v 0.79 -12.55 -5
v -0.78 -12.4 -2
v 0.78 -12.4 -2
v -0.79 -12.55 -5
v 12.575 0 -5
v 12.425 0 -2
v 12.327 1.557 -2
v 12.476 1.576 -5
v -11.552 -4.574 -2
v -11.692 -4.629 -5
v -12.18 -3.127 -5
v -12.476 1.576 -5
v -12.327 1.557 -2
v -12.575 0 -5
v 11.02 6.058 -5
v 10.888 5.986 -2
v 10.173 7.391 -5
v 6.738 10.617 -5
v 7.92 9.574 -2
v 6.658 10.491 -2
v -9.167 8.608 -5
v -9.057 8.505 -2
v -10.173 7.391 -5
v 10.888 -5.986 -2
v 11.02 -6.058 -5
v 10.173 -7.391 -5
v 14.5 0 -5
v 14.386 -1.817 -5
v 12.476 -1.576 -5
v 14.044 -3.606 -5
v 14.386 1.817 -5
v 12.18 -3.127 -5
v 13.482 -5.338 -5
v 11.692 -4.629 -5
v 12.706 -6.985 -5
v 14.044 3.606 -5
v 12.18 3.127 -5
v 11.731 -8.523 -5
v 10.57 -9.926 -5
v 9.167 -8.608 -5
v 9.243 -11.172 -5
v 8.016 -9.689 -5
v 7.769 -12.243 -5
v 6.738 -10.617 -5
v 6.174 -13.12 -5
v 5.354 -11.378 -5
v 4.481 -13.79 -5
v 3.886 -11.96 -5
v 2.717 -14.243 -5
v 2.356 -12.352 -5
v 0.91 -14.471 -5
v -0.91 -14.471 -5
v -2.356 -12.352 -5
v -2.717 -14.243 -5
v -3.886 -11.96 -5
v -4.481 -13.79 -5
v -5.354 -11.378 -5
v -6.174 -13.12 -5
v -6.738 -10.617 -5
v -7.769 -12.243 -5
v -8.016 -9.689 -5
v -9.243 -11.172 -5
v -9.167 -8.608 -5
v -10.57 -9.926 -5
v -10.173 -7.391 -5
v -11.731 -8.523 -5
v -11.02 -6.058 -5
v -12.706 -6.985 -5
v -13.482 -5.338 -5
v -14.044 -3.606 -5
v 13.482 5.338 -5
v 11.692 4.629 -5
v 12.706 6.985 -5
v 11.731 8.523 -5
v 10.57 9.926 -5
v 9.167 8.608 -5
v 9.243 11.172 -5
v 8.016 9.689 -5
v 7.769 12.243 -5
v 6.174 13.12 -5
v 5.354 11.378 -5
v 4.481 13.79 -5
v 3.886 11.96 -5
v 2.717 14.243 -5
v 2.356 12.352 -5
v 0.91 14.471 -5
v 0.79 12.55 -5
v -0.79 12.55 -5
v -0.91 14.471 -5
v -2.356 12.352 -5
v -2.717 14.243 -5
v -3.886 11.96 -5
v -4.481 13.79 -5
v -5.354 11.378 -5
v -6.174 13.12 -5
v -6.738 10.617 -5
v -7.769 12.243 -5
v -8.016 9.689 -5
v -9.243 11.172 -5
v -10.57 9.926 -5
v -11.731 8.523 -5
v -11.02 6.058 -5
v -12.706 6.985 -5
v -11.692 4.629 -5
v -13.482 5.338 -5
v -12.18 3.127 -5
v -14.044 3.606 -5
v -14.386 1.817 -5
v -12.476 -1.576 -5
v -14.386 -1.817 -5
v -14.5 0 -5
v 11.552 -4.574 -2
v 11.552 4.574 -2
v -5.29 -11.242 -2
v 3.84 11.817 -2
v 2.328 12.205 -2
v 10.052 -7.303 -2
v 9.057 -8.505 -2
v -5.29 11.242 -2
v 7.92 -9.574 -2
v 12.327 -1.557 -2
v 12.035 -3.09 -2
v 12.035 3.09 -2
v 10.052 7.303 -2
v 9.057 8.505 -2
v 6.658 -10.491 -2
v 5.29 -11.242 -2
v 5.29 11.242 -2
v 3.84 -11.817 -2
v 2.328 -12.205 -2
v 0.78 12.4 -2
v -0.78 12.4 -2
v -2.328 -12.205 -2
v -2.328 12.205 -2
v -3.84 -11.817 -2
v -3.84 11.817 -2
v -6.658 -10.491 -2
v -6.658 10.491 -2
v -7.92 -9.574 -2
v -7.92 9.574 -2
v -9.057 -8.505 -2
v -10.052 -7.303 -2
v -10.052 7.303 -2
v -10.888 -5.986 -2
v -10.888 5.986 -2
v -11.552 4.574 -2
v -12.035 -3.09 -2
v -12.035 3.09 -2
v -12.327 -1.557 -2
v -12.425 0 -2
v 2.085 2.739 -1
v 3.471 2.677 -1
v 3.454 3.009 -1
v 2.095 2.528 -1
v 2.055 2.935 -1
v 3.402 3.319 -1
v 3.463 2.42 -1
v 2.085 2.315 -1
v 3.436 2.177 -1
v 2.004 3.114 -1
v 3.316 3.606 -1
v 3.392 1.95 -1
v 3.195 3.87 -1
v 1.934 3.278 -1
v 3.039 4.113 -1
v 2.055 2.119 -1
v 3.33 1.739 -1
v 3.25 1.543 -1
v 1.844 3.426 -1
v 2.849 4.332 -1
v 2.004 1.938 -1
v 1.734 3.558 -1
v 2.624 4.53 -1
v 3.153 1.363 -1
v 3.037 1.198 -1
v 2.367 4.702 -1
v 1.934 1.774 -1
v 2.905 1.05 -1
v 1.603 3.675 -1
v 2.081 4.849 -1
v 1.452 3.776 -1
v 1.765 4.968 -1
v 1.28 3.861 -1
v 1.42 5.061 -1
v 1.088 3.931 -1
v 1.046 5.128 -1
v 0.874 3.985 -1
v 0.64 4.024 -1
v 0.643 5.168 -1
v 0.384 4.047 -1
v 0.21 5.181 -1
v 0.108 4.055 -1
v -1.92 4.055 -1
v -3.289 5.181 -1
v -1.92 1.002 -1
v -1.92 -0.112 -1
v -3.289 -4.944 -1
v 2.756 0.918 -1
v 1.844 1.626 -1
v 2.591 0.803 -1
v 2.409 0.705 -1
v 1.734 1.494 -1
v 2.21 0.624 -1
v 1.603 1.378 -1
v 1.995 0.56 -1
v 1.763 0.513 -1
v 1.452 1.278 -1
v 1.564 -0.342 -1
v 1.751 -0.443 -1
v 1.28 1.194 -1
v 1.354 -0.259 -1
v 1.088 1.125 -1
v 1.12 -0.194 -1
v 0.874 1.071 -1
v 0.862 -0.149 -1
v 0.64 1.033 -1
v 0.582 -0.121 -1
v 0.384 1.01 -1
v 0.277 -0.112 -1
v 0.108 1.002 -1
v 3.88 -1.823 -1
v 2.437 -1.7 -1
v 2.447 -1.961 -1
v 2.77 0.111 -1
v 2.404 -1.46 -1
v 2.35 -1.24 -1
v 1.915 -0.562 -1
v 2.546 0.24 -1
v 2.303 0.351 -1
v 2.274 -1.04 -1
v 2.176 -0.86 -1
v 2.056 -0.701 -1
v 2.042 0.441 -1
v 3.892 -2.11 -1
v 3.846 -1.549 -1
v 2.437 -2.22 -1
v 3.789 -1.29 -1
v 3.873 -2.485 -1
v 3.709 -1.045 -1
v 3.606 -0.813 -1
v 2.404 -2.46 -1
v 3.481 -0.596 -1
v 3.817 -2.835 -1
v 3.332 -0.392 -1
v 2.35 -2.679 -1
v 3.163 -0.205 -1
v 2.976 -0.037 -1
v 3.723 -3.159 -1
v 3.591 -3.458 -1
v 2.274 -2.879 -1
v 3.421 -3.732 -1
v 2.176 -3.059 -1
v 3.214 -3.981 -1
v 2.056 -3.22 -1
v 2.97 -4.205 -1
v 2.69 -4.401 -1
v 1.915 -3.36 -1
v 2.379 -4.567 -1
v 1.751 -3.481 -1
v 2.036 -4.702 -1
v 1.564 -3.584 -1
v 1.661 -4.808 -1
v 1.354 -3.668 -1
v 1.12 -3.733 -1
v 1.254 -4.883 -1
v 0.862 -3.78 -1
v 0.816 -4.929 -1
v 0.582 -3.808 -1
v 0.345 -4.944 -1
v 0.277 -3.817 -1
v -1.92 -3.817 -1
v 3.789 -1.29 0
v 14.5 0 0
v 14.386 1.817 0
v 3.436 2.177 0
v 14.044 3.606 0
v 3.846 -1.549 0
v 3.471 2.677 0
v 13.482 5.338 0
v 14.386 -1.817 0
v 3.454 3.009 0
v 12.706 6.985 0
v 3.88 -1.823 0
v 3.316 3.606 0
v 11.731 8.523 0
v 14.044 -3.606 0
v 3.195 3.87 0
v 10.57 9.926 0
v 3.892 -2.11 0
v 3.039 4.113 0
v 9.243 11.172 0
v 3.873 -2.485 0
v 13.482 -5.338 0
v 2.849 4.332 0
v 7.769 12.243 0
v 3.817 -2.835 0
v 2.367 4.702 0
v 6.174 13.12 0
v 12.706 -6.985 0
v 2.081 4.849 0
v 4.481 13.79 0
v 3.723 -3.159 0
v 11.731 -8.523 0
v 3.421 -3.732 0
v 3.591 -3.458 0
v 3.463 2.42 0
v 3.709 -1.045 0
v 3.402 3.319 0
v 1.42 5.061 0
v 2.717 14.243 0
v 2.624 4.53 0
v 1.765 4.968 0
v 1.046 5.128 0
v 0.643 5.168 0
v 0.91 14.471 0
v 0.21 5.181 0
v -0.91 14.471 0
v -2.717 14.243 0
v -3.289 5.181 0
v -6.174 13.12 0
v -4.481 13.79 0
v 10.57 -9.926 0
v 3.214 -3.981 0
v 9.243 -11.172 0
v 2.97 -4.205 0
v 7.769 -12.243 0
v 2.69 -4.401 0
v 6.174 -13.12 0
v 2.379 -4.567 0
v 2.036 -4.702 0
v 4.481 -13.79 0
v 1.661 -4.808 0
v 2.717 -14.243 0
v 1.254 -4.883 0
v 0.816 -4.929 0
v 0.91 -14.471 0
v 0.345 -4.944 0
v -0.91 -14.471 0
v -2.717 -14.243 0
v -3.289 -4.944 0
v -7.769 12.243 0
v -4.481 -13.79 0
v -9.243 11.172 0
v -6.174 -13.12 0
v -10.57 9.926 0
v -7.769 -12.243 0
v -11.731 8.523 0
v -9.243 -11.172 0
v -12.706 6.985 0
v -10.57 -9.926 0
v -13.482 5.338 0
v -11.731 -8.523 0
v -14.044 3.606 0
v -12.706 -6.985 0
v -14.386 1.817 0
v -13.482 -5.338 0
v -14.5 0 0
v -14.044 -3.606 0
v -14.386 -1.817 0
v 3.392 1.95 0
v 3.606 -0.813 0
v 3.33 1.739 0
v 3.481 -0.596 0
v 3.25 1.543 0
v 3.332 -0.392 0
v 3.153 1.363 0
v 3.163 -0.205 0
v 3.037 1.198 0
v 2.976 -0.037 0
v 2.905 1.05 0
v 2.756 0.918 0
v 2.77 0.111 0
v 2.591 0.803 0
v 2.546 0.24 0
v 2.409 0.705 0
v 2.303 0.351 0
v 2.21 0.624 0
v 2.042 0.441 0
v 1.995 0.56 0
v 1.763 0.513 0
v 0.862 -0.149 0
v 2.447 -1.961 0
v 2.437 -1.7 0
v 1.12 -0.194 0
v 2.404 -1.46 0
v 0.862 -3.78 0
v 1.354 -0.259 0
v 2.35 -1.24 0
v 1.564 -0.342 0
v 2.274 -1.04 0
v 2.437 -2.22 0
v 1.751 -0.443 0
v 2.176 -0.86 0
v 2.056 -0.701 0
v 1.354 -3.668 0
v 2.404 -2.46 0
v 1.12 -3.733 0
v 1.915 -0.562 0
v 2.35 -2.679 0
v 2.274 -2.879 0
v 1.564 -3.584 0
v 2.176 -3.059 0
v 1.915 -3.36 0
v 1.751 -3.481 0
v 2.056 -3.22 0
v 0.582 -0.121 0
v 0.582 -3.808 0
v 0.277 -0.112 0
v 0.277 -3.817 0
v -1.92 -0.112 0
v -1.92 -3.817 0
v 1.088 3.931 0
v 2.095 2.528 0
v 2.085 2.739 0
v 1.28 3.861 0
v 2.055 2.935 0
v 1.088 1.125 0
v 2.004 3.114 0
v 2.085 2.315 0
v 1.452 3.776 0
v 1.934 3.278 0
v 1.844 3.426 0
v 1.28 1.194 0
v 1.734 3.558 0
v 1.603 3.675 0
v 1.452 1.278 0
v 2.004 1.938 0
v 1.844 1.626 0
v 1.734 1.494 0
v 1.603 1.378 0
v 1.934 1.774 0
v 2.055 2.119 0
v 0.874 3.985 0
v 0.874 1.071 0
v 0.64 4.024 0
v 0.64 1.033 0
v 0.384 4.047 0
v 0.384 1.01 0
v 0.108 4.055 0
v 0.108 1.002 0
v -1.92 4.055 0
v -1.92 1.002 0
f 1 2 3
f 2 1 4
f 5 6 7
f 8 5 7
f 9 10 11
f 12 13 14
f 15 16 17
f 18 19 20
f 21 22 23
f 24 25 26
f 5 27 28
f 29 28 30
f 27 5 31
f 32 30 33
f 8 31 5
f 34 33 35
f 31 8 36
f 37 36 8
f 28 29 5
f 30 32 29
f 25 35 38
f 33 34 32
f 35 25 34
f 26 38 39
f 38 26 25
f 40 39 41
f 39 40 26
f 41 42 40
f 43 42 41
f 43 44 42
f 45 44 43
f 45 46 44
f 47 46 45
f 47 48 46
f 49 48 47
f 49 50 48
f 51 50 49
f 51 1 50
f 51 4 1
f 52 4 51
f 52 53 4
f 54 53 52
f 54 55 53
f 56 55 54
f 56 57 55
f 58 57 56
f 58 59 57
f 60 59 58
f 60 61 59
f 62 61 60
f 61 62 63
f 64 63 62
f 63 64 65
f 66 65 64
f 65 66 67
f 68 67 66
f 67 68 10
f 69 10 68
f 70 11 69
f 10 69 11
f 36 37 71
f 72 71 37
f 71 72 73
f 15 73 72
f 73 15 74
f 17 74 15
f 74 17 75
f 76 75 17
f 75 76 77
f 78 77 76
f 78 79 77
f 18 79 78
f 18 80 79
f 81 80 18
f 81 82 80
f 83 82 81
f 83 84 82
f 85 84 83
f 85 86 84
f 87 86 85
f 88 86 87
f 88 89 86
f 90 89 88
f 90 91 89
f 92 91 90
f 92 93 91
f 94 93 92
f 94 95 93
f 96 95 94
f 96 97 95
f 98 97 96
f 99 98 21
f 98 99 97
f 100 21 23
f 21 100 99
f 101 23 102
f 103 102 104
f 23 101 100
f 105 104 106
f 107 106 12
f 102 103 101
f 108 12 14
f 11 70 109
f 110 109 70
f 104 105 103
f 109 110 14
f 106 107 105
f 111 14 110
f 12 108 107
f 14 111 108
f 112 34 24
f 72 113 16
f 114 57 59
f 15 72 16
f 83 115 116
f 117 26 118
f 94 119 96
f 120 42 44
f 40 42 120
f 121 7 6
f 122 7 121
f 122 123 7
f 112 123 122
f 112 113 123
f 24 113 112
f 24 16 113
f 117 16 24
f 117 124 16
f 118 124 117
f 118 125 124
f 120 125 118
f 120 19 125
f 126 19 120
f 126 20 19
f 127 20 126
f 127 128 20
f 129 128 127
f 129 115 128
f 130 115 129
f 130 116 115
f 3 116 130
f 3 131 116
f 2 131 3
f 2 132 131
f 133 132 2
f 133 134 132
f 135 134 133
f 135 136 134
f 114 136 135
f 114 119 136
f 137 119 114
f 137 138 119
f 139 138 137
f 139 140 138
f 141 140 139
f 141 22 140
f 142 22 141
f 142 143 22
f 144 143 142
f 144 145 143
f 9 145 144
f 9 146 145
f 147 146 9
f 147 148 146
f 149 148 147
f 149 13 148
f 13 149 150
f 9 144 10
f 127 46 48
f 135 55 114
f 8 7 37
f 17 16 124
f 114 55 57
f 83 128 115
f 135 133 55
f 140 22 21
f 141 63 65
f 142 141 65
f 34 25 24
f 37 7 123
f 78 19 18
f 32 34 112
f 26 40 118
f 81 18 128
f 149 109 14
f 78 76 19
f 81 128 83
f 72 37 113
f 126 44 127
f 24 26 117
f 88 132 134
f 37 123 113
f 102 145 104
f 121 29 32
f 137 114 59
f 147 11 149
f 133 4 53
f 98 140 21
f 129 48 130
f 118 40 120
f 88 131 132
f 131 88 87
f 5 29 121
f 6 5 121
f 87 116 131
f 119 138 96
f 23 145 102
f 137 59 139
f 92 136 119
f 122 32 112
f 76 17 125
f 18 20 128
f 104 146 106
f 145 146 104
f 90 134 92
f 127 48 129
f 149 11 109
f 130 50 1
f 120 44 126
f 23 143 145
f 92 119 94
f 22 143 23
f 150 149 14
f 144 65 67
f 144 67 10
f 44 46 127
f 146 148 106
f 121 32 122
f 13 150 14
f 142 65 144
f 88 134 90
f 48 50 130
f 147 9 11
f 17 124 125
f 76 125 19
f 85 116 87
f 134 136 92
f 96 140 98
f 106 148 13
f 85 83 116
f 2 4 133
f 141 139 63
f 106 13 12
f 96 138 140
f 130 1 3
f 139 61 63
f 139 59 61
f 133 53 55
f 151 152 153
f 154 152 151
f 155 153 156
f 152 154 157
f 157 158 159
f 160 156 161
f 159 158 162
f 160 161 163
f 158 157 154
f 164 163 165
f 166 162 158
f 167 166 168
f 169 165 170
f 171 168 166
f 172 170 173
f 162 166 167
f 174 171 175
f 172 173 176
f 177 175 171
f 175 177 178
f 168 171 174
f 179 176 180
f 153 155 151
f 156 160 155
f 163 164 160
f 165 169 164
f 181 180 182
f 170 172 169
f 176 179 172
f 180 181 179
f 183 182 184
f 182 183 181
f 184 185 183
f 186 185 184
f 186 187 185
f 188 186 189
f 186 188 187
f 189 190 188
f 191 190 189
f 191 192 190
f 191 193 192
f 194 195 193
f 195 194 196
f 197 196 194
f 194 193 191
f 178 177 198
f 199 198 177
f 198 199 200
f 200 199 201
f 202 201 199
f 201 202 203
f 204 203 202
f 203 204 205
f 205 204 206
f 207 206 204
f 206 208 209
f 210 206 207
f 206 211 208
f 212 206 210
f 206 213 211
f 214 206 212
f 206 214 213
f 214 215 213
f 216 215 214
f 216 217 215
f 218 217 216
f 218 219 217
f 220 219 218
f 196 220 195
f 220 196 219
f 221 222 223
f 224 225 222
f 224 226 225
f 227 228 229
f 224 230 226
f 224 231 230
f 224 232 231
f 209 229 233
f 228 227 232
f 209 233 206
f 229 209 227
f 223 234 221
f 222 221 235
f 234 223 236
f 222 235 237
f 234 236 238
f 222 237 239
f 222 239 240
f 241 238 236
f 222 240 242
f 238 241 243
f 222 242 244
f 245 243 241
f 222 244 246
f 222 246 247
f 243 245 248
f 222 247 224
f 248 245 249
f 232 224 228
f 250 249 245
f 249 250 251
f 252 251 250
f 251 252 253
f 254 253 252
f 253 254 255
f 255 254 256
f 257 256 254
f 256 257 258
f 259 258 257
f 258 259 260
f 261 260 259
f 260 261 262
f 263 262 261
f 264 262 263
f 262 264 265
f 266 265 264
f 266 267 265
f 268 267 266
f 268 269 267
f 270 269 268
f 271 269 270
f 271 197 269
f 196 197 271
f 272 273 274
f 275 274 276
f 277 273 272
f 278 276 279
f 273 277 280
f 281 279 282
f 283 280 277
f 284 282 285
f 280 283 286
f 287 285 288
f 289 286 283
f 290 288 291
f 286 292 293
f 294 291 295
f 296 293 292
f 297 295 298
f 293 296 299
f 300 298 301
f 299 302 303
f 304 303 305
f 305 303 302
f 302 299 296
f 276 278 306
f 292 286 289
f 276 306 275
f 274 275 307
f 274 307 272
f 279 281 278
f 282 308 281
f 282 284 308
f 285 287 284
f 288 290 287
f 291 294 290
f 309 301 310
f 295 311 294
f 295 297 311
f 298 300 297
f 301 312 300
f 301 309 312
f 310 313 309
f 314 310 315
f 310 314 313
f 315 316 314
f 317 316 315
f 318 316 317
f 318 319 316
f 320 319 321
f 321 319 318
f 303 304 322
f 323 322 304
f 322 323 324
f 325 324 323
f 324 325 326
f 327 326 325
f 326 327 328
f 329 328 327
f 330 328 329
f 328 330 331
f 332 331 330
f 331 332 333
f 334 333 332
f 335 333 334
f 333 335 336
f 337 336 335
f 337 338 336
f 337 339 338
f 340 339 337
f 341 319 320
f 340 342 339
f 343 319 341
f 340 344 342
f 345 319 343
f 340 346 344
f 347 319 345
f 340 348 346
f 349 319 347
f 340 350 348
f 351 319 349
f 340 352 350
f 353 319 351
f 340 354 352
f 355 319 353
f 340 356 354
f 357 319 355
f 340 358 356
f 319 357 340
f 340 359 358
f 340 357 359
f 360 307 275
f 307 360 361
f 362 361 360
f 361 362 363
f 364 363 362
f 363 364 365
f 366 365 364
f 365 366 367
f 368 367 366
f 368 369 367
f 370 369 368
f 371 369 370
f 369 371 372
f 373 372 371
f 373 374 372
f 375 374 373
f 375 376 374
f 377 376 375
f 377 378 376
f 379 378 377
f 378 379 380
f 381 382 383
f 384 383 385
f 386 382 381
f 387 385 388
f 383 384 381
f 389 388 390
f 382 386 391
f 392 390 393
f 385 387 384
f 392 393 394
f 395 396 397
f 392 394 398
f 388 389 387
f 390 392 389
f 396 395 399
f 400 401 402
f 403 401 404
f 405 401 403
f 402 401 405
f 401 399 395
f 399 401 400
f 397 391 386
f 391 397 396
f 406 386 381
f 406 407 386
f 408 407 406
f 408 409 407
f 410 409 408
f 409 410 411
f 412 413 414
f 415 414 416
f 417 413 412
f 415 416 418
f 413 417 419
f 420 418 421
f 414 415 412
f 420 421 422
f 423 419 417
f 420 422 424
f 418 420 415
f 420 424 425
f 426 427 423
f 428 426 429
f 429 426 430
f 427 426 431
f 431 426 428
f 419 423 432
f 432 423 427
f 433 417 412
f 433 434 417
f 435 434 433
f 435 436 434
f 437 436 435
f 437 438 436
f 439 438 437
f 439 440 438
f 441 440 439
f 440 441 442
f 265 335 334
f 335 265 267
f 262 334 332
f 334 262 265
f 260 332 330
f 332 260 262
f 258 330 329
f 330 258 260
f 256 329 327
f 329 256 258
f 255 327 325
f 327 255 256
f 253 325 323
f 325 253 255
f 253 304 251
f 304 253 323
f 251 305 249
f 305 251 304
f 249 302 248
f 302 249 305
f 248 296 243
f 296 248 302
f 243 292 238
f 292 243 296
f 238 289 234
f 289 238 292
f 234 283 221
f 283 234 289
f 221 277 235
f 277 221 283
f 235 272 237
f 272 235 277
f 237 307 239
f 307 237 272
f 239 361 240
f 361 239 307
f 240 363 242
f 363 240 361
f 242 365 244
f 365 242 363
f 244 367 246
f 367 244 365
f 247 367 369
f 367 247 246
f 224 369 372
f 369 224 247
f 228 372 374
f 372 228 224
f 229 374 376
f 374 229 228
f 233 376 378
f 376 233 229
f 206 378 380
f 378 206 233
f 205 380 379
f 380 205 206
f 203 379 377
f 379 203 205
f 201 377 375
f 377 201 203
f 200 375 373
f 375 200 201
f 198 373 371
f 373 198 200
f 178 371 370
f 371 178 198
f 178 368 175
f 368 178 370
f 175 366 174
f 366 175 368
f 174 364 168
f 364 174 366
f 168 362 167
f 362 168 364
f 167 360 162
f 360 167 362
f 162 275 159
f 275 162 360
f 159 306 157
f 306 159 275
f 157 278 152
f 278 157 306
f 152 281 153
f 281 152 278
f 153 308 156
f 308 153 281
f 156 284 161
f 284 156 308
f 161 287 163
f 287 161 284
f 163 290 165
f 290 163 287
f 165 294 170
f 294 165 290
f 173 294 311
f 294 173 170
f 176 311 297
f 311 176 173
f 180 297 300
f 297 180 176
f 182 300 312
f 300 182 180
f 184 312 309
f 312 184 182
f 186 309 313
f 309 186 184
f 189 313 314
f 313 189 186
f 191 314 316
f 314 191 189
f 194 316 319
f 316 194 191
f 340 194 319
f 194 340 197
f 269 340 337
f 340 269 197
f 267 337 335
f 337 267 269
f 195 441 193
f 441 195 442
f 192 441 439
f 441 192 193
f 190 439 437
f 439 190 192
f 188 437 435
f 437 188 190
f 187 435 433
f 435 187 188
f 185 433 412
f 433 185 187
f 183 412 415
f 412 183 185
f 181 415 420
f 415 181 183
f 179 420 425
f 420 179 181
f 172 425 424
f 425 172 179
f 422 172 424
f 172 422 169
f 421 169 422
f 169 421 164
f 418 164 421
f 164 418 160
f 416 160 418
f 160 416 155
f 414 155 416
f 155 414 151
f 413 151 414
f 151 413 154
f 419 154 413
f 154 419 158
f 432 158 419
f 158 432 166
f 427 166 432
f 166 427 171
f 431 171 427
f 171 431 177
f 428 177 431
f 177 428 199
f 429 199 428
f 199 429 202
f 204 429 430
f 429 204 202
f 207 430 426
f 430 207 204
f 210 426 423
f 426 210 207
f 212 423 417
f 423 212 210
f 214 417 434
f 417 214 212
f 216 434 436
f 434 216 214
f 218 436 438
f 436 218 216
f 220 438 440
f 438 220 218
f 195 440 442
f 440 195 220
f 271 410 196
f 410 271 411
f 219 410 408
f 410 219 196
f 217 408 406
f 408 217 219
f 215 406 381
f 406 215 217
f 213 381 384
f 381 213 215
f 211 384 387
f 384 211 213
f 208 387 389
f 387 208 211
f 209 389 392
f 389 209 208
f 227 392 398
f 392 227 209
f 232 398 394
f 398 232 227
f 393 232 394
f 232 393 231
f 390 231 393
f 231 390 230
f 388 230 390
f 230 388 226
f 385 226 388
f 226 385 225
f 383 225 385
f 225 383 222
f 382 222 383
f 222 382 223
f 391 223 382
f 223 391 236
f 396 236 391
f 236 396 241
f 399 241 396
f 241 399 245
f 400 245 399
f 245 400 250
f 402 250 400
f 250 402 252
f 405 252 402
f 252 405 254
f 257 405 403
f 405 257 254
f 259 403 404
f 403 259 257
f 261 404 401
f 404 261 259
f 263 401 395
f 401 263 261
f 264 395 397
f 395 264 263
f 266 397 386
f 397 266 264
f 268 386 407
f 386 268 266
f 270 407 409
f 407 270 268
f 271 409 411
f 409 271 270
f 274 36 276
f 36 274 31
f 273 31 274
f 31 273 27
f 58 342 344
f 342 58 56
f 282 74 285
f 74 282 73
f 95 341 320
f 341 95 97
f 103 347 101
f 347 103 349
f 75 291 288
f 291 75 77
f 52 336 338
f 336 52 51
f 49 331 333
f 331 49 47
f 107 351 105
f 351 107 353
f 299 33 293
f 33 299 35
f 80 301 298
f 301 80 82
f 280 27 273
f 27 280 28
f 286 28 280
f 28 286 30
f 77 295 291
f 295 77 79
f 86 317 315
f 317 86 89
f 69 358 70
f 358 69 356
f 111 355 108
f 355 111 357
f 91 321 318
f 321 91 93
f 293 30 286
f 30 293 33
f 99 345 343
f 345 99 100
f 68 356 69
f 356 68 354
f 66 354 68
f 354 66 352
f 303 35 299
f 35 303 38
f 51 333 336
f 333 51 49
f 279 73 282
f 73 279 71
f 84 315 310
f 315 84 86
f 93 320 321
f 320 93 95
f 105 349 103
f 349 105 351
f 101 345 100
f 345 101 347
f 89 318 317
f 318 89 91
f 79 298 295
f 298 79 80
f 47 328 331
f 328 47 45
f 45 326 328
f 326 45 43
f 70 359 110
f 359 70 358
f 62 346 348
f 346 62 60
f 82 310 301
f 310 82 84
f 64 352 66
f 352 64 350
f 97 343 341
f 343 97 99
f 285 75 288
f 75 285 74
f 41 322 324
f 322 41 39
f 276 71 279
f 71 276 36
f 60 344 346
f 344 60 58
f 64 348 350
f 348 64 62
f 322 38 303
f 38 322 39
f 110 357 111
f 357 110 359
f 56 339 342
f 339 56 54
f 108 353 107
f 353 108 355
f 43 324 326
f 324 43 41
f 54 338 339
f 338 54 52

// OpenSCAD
$fn = 50;

difference() {
	union() {
		translate(v = [0, 0, -5.0]) {
			cylinder(h = 5, r = 14.5);
		}
	}
	union() {
		#translate(v = [0, 0, -5.0]) {
			cylinder(h = 3, r1 = 12.575, r2 = 12.425);
		}
		translate(v = [0, 0, -1]) {
			linear_extrude(height = 1) {
				text(font = "Impact", halign = "center", size = 10, text = "B", valign = "center");
			}
		}
	}
}
